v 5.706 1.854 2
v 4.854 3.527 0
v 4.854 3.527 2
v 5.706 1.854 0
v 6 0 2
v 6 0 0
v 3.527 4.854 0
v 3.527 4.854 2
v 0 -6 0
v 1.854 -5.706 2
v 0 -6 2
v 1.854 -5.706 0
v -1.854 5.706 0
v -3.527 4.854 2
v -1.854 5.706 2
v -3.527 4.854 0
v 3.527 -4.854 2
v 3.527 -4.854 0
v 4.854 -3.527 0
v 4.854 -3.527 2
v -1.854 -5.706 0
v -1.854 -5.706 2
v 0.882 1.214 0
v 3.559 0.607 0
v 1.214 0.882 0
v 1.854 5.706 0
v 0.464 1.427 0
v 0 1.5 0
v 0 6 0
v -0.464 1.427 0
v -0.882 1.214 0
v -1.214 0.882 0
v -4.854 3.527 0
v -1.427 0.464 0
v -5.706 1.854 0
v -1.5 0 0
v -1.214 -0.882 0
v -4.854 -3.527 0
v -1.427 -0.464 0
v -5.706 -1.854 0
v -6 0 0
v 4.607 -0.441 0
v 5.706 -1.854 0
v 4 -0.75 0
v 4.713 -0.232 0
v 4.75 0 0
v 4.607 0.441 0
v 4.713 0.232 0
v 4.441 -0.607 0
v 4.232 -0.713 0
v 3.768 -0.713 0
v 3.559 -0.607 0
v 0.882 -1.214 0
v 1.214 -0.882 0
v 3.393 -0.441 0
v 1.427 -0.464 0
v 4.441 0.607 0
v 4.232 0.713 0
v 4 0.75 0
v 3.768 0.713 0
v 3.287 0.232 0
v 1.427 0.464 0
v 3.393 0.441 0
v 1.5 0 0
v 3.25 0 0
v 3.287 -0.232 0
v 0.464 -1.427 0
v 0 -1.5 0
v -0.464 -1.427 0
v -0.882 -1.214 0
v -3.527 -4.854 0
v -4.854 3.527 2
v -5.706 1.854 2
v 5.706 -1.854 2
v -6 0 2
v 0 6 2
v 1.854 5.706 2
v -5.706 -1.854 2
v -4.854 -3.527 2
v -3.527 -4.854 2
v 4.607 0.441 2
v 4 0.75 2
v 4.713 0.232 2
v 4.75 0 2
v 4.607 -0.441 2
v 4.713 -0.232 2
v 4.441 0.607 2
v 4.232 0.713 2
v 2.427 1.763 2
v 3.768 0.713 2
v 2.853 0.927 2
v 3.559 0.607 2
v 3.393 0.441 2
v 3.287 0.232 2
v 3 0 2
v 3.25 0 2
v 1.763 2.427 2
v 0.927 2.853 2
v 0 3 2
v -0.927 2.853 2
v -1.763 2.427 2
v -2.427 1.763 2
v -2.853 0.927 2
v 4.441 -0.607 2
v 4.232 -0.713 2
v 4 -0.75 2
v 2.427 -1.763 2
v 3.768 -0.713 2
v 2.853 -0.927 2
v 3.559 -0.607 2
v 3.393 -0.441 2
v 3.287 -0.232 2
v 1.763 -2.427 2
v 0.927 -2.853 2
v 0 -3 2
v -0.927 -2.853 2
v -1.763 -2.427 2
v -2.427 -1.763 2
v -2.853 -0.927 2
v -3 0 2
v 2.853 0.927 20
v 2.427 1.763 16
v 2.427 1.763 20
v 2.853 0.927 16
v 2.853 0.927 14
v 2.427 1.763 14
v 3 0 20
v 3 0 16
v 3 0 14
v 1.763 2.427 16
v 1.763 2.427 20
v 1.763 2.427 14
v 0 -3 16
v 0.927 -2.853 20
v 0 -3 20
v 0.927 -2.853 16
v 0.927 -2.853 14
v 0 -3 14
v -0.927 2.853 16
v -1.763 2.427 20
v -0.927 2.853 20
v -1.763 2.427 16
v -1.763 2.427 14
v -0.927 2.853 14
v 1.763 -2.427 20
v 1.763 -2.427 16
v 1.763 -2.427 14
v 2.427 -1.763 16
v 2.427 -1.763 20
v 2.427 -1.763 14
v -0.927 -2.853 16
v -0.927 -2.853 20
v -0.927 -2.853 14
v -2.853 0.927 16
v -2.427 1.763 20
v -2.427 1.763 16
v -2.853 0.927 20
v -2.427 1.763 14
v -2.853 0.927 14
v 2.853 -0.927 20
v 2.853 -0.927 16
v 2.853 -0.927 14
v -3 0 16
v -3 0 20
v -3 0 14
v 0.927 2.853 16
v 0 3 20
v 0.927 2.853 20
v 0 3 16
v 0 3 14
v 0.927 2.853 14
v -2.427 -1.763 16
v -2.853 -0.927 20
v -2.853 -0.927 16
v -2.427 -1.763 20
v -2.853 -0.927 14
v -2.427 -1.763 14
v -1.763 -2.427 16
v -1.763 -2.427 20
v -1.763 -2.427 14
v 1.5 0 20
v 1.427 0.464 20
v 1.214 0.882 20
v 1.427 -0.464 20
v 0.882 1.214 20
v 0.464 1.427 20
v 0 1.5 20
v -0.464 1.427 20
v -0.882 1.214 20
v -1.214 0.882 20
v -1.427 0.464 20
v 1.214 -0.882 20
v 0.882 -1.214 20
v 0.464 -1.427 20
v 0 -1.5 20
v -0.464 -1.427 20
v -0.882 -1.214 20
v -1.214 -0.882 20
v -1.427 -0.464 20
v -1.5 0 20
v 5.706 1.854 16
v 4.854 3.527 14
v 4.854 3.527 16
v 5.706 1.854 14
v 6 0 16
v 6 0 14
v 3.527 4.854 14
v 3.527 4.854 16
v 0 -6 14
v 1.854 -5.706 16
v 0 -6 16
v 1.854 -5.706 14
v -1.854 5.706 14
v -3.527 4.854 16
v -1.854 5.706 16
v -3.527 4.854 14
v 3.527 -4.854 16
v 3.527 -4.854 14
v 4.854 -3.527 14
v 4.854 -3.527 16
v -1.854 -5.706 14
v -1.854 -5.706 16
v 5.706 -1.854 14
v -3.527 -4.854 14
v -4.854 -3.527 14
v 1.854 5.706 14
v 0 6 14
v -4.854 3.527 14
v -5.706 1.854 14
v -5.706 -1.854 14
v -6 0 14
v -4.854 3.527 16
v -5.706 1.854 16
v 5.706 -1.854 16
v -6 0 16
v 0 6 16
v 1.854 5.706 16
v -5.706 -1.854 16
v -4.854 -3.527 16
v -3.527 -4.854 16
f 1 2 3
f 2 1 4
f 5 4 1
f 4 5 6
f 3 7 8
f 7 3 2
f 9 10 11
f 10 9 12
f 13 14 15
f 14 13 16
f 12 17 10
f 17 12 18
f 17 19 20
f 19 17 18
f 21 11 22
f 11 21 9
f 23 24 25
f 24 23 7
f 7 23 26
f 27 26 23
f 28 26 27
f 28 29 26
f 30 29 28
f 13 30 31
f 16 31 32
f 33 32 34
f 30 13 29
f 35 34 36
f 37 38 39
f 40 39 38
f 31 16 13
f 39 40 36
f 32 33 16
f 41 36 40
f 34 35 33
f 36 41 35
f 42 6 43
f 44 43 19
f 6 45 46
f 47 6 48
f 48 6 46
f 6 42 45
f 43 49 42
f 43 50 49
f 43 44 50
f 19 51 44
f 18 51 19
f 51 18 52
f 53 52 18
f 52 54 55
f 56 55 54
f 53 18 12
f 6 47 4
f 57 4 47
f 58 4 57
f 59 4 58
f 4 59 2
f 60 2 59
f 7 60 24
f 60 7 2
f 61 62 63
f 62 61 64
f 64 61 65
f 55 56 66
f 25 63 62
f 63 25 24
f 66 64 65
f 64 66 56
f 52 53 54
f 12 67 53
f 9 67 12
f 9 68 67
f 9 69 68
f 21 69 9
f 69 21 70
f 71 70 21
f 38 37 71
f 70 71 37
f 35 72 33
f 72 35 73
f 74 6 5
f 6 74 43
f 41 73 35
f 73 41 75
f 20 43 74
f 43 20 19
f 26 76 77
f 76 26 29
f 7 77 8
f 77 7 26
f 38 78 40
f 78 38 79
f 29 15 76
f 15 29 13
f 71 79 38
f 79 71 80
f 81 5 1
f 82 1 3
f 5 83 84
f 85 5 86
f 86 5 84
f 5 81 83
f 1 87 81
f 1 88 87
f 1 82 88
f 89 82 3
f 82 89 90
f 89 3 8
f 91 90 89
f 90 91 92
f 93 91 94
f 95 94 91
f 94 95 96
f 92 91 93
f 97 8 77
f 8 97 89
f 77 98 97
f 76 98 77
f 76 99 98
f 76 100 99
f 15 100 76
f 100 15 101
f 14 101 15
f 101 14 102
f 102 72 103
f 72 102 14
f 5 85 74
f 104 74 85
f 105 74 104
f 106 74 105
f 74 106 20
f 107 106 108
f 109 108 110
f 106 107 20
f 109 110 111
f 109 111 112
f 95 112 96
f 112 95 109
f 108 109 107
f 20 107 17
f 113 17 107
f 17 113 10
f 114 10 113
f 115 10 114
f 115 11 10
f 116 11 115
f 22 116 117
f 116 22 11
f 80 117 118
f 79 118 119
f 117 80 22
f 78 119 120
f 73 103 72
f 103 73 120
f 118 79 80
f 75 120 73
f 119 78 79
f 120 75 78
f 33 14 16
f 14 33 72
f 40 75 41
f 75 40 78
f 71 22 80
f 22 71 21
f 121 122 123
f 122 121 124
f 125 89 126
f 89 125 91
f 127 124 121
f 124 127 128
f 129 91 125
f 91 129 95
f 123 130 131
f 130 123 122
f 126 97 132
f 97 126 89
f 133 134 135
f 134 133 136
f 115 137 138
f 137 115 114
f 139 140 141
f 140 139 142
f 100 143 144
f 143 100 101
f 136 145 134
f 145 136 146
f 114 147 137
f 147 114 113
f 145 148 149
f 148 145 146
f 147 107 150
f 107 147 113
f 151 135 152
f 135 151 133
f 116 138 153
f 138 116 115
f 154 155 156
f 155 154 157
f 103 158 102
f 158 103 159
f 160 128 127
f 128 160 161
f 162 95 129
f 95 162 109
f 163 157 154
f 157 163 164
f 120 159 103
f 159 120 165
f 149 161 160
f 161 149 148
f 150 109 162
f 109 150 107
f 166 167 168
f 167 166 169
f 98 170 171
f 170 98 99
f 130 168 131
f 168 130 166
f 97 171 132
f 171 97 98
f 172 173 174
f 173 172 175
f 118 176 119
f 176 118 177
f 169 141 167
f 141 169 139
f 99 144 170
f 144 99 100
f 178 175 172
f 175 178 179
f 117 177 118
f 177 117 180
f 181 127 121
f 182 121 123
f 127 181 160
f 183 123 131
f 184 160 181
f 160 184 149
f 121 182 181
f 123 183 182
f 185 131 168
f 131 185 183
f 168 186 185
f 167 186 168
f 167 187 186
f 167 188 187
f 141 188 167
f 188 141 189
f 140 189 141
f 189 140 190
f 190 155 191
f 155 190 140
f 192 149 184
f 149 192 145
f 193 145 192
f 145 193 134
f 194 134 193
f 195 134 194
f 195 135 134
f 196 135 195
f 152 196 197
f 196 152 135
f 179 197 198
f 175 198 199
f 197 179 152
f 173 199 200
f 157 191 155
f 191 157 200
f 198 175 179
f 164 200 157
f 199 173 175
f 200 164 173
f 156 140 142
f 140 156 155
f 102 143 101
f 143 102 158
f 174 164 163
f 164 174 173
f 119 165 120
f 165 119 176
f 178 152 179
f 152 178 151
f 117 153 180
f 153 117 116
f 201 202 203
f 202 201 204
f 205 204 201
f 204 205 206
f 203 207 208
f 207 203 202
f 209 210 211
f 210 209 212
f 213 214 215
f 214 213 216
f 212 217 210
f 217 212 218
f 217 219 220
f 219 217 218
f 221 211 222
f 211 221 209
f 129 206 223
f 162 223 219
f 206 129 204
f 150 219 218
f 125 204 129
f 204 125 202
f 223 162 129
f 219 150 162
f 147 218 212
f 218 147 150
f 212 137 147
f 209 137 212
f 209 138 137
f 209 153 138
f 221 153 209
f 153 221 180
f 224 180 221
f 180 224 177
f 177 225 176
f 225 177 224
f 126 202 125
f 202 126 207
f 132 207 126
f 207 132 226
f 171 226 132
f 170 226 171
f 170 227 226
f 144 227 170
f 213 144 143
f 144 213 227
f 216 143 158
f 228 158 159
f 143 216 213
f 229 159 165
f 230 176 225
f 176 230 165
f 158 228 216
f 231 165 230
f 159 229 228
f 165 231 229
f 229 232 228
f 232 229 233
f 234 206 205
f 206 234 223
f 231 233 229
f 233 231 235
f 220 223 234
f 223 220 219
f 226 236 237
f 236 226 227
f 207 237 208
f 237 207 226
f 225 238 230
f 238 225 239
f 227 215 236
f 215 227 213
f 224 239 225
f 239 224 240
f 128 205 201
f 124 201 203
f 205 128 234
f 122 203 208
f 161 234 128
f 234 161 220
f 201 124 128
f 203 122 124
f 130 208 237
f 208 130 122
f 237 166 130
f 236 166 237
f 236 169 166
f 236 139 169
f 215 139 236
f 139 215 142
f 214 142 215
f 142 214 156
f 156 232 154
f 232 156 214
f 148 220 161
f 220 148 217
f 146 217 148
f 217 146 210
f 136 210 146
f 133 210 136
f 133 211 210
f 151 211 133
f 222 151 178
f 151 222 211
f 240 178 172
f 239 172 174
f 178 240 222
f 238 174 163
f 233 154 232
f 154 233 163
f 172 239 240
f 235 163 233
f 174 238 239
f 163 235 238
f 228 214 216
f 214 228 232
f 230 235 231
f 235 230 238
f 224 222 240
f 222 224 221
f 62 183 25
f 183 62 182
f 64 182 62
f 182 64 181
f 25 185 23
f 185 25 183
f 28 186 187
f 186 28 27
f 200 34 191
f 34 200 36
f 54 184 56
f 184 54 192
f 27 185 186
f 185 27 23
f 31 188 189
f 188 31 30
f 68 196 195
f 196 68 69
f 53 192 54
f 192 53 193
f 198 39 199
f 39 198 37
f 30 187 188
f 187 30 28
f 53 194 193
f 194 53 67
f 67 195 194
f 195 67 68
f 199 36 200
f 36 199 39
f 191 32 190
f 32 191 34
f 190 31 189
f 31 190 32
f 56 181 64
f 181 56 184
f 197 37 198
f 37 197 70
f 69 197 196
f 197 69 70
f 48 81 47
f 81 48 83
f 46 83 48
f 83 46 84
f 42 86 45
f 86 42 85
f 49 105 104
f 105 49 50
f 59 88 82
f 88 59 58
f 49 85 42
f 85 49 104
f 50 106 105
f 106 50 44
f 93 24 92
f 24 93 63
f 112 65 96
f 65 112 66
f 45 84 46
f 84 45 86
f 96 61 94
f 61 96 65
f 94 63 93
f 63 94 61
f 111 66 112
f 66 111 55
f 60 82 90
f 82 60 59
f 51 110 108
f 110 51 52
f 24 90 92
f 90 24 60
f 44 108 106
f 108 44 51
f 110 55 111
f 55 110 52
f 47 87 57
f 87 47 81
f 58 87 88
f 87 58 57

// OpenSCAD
module parametric_coil(r_corpus=3,r_border=6,h_border=2,h_corpus=12,h_grip=4, r_hole=1.5) {
$fn=20;
 height=h_border*2+h_corpus+h_grip;

 difference() {
  union() {
   cylinder(r=r_border,h=h_border);
   cylinder(r=r_corpus,h=height);
   translate([0,0,h_corpus+h_border]) cylinder(r=r_border, h=h_border);
  }
  translate([0,0,-1]) cylinder(r=r_hole,h=height+2);
  translate([r_corpus+1,0,-1]) cylinder(r=0.75,h=4);
 }
}

parametric_coil();
